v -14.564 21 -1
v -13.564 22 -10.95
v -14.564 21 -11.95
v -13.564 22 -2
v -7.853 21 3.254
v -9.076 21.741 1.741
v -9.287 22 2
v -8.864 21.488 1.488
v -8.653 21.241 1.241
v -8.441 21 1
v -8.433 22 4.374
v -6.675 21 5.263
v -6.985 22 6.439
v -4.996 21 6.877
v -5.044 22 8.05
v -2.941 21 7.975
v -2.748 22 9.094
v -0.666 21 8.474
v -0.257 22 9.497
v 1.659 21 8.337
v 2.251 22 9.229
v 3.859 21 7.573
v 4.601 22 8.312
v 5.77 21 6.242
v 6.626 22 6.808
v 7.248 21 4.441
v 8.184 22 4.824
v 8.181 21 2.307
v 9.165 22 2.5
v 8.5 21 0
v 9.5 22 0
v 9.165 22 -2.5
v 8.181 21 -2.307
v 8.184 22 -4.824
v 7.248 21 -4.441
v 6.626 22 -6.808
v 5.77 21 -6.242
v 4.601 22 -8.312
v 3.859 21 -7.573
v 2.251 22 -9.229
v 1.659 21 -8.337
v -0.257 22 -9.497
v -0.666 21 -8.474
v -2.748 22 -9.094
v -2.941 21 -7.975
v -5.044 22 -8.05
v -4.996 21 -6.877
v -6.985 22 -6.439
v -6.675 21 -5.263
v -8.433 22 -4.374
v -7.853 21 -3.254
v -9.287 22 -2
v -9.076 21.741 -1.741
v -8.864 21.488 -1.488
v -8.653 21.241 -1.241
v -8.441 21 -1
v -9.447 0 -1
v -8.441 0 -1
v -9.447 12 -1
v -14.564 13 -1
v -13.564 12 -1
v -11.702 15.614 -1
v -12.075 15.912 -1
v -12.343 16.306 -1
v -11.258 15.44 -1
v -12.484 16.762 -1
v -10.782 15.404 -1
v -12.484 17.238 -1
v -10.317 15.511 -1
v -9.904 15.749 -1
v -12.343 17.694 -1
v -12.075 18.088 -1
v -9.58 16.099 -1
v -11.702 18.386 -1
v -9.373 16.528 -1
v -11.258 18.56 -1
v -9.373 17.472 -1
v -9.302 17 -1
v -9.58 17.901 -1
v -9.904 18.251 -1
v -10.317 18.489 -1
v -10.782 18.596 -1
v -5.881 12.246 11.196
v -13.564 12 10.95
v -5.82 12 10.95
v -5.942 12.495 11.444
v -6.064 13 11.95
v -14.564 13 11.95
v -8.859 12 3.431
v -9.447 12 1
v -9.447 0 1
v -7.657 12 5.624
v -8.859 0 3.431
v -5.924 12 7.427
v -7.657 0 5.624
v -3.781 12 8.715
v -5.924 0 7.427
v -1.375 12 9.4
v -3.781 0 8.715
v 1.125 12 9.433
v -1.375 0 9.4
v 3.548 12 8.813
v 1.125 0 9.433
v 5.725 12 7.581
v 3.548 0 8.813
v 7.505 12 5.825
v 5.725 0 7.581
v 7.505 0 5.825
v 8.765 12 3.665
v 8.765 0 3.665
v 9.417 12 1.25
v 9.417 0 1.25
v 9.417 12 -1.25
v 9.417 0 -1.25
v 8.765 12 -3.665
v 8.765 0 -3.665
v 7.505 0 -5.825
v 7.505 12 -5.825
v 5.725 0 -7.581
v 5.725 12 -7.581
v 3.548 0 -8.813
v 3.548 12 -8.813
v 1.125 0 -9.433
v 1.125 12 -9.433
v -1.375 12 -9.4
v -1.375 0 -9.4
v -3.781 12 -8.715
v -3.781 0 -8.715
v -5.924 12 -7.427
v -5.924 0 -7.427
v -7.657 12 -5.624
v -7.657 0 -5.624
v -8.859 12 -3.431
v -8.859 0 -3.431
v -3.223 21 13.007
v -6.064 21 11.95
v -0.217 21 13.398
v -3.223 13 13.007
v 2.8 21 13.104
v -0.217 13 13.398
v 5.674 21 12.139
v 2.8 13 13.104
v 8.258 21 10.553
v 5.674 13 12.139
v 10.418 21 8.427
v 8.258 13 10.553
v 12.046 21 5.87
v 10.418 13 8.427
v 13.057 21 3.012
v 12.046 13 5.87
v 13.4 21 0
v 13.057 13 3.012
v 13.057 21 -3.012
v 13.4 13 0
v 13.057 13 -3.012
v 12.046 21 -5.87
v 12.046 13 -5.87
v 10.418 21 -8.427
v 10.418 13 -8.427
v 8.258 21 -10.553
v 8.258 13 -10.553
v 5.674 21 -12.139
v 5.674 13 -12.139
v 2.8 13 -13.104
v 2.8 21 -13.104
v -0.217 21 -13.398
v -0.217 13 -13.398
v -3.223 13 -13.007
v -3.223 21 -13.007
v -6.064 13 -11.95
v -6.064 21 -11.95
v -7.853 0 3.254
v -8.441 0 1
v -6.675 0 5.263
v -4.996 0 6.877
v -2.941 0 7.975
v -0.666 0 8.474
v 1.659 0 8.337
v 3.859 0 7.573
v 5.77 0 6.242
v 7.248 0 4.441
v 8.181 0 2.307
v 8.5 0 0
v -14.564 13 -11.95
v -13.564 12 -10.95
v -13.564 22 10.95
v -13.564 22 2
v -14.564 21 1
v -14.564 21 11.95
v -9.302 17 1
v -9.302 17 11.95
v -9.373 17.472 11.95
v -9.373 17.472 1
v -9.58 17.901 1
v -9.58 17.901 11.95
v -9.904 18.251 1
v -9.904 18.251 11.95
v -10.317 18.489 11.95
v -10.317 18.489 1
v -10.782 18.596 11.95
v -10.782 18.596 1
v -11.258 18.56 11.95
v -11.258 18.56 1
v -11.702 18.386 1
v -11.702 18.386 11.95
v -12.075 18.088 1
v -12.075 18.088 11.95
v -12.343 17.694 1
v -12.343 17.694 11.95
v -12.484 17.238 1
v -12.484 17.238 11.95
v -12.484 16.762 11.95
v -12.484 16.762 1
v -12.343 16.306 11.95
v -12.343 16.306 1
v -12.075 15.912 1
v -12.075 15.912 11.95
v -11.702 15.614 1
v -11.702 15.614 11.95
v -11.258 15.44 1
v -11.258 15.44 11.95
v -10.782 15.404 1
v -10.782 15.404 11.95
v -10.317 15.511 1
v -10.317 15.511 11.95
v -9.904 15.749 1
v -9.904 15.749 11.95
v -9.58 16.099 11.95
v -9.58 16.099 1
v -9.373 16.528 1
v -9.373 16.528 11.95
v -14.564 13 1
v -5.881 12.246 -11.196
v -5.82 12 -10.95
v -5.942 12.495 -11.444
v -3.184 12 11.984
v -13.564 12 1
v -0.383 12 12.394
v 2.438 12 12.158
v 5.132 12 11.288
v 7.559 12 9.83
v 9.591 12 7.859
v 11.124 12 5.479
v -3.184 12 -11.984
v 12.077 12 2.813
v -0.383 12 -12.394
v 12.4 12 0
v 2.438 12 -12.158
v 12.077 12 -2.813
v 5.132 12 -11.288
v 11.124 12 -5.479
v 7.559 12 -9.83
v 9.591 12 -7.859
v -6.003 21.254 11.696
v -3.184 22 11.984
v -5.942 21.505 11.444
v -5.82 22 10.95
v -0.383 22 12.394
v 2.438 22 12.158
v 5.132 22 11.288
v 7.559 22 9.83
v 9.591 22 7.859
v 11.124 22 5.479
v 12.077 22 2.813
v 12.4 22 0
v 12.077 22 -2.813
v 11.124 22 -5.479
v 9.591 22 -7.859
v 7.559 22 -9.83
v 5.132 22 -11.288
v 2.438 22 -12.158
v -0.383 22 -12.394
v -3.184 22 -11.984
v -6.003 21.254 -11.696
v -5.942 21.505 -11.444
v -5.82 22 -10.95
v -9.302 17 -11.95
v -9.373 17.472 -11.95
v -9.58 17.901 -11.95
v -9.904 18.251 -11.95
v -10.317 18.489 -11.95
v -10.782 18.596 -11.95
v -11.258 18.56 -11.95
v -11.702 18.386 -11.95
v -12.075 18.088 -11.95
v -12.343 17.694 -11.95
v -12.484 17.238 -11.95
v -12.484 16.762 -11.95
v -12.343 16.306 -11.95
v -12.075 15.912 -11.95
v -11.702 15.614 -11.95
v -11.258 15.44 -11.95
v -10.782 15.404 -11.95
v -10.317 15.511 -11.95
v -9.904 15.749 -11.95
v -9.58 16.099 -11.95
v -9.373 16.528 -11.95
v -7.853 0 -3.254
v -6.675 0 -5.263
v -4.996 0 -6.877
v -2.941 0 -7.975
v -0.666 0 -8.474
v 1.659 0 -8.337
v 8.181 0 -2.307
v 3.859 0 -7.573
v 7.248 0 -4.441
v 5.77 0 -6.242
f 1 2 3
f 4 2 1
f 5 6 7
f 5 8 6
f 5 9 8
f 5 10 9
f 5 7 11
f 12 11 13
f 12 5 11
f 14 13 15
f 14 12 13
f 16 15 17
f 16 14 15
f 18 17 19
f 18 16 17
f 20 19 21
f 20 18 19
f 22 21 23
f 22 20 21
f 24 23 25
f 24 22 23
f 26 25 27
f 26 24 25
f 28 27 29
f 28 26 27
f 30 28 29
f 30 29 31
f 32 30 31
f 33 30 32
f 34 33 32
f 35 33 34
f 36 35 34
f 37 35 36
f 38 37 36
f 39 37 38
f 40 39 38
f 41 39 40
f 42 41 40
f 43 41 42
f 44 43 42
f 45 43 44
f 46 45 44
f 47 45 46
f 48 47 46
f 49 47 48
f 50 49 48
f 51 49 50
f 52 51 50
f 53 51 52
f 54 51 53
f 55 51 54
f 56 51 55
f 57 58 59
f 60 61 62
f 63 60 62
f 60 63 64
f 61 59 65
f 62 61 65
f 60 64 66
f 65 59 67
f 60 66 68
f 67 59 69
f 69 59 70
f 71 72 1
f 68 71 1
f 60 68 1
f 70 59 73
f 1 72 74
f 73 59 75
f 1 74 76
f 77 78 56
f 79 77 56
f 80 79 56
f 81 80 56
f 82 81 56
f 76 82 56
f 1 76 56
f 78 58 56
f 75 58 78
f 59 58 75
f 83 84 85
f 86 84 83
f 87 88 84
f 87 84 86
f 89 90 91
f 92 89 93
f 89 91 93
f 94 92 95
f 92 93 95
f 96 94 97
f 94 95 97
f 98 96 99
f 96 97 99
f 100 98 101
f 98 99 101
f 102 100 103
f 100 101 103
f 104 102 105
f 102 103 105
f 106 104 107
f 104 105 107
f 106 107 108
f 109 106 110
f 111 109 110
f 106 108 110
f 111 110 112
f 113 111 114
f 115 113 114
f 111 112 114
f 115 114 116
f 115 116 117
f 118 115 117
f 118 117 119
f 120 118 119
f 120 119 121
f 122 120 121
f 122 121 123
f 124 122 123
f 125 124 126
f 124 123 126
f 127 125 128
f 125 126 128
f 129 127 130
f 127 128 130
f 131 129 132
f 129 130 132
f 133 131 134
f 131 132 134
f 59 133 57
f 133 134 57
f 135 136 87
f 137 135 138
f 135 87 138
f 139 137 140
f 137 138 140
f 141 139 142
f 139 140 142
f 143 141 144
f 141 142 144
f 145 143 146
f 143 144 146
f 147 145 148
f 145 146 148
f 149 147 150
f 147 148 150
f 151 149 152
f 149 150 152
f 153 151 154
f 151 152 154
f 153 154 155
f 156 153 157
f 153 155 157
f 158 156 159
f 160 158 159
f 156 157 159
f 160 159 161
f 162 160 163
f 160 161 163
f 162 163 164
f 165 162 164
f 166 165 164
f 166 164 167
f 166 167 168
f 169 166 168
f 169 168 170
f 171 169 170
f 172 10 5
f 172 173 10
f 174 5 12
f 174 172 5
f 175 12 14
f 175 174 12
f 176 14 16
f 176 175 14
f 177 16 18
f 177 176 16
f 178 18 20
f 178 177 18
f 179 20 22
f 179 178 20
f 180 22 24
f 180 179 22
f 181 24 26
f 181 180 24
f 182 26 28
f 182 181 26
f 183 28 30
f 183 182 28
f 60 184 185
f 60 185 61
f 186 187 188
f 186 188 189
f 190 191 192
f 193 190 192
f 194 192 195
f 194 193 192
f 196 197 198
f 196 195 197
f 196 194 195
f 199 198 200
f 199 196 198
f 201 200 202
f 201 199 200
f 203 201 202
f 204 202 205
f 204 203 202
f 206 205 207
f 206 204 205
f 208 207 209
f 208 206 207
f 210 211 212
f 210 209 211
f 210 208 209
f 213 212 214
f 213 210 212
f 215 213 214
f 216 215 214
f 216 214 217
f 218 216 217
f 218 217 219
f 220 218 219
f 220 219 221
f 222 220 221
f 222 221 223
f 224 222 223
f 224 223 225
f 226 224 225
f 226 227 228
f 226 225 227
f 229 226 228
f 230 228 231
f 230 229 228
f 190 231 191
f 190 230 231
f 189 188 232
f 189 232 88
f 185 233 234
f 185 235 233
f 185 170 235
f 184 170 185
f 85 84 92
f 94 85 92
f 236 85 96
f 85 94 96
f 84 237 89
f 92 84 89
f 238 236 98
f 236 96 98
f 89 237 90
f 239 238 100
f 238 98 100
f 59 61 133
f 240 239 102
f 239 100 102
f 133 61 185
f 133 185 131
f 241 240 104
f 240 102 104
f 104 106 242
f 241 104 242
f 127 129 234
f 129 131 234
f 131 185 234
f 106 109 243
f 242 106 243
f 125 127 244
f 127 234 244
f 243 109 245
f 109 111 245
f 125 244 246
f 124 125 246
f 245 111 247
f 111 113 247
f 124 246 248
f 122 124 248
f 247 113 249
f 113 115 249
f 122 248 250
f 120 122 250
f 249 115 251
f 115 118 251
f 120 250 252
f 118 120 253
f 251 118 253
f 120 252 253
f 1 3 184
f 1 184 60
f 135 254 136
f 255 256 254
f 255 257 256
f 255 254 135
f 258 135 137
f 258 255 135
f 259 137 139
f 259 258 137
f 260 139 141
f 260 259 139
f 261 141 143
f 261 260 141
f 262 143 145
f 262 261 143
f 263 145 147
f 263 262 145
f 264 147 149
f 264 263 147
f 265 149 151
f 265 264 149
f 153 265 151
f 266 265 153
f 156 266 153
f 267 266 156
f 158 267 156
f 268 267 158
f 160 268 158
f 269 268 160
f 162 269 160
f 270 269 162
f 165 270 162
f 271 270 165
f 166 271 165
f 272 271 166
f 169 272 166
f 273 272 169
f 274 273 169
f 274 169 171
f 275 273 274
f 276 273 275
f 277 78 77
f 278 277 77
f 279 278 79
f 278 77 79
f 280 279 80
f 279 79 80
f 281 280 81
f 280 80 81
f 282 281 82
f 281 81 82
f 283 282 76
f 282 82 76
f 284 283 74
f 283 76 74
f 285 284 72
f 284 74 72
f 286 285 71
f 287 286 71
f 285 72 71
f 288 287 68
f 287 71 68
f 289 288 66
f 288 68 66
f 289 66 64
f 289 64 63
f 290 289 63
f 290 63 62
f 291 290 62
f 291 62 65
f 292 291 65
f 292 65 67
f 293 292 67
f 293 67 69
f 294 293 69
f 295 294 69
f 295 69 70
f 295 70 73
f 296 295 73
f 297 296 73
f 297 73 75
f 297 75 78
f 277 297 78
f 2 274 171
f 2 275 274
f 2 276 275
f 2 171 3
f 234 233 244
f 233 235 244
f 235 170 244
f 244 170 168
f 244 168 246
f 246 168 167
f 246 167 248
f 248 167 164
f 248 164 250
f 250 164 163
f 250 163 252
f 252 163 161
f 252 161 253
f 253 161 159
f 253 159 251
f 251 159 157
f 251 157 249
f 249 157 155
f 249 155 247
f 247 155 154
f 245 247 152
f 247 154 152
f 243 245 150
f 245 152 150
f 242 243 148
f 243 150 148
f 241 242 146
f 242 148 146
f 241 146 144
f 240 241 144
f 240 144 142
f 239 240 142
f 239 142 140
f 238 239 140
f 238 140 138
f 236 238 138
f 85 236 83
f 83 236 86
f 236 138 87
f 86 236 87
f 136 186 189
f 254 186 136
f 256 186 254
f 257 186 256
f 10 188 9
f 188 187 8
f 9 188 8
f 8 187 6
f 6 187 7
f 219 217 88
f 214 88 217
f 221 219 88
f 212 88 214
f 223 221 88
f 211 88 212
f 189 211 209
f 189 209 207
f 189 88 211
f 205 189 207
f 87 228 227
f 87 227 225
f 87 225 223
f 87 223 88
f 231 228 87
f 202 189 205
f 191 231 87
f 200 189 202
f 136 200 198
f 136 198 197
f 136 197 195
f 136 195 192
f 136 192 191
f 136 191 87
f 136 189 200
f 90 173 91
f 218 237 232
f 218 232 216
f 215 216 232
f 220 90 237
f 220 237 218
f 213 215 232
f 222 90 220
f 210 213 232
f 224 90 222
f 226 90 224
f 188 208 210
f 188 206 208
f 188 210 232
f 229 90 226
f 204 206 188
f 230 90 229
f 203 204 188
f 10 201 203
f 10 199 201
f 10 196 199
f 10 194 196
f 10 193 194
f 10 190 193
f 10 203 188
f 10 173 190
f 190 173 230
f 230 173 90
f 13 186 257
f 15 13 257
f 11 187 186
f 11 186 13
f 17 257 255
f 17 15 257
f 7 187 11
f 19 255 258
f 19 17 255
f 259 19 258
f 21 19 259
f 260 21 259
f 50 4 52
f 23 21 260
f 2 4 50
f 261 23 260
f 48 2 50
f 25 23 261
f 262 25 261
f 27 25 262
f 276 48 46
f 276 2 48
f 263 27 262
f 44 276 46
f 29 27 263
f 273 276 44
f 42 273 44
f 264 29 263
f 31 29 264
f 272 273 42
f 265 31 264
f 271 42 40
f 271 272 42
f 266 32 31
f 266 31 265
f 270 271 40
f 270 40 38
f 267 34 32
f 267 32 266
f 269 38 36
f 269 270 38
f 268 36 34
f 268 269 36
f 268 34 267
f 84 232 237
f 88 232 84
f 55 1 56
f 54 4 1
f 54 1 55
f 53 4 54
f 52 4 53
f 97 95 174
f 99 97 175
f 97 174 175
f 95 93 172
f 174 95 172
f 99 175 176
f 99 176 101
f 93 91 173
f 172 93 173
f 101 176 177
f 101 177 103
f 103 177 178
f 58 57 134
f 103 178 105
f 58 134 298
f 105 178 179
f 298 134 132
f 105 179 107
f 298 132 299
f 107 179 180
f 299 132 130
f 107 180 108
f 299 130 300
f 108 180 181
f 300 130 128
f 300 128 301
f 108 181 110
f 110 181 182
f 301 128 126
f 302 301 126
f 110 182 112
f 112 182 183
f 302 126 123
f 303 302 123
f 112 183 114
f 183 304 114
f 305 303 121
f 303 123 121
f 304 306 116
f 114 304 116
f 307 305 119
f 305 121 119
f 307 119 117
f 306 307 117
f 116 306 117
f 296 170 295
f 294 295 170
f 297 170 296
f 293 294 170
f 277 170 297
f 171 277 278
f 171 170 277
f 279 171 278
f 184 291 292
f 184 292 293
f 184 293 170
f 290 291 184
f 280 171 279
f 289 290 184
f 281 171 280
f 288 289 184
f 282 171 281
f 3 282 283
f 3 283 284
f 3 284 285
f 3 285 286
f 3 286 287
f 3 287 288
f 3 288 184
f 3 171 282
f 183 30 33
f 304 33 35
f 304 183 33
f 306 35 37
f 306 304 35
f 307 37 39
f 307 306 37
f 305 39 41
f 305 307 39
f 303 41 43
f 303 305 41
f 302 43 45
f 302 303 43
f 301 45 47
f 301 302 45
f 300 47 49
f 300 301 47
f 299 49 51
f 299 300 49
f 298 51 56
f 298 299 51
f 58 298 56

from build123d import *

# Parameters (mm, degrees)
SKETCH1_R               = 9.5
SKETCH1_R_2             = 8.5
BOSS_EXTRUDE1_DEPTH     = 12
SKETCH2_R               = 13.4
SKETCH2_R_2             = 8.5
BOSS_EXTRUDE2_DEPTH     = 10
SKETCH3_W               = 2
SKETCH3_H               = 22
CUT_EXTRUDE1_DEPTH      = 21
BOSS_EXTRUDE3_DEPTH     = 10
SKETCH4_R               = 1.6
CUT_EXTRUDE2_DEPTH      = 21
CUT_EXTRUDE2_DEPTH_BACK = 21
CHAMFER1_SIZE           = 1


with BuildPart() as part:
    # Sketch1 → Boss-Extrude1 (new body)
    with BuildSketch(Plane(origin=(0, 0, 0), x_dir=(1, 0, 0), z_dir=(0, 1, 0))):
        Circle(SKETCH1_R)
        Circle(SKETCH1_R_2, mode=Mode.SUBTRACT)
    extrude(amount=BOSS_EXTRUDE1_DEPTH)

    # Sketch2 → Boss-Extrude2 (add)
    with BuildSketch(Plane(origin=(0, 12, 0), x_dir=(1, 0, 0), z_dir=(0, 1, 0))):
        Circle(SKETCH2_R)
        Circle(SKETCH2_R_2, mode=Mode.SUBTRACT)
    extrude(amount=BOSS_EXTRUDE2_DEPTH)

    # Sketch3 → Cut-Extrude1 (cut)
    with BuildSketch(Plane(origin=(0, 0, 0), x_dir=(0, 0, -1), z_dir=(1, 0, 0))):
        with Locations((0, 11)):
            Rectangle(SKETCH3_W, SKETCH3_H)
    extrude(amount=-CUT_EXTRUDE1_DEPTH, mode=Mode.SUBTRACT)

    # Sketch6 → Boss-Extrude3 (add)
    with BuildSketch(Plane(origin=(0, 22, 0), x_dir=(1, 0, 0), z_dir=(0, 1, 0))):
        Polygon((-9.518301515, -1), (-14.563720806, -1), (-14.563720806, -11.949530953), (-6.063720806, -11.949530953), align=None)
        Polygon((-6.063720806, 11.949530953), (-14.563720806, 11.949530953), (-14.563720806, 1), (-9.518301515, 1), align=None)
    extrude(amount=-BOSS_EXTRUDE3_DEPTH)

    # Sketch4 → Cut-Extrude2 (cut, two sides)
    with BuildSketch(Plane.XY.offset(-1)) as cut_extrude2_sk:
        with Locations((-10.901802989, 17)):
            Circle(SKETCH4_R)
    extrude(amount=CUT_EXTRUDE2_DEPTH, mode=Mode.SUBTRACT)
    extrude(cut_extrude2_sk.sketch, amount=-CUT_EXTRUDE2_DEPTH_BACK, mode=Mode.SUBTRACT)

    # Chamfer1
    chamfer1_edges = [part.edges().sort_by_distance(p)[0] for p in [
        (0.500870333, 22, -8.485230045),
        (-11.502346157, 22, 1),
        (-11.502346157, 22, -1),
        (13.4, 22, 0),
        (13.4, 12, 0),
        (-10.313720806, 22, 11.949530953),
        (-14.563720806, 22, 6.474765476),
        (-10.313720806, 12, 11.949530953),
        (-14.563720806, 12, 6.474765476),
        (-10.313720806, 22, -11.949530953),
        (-14.563720806, 22, -6.474765476),
        (-14.563720806, 12, -6.474765476),
        (-10.313720806, 12, -11.949530953),
    ]]
    chamfer(chamfer1_edges, length=CHAMFER1_SIZE)


solid = part.part
